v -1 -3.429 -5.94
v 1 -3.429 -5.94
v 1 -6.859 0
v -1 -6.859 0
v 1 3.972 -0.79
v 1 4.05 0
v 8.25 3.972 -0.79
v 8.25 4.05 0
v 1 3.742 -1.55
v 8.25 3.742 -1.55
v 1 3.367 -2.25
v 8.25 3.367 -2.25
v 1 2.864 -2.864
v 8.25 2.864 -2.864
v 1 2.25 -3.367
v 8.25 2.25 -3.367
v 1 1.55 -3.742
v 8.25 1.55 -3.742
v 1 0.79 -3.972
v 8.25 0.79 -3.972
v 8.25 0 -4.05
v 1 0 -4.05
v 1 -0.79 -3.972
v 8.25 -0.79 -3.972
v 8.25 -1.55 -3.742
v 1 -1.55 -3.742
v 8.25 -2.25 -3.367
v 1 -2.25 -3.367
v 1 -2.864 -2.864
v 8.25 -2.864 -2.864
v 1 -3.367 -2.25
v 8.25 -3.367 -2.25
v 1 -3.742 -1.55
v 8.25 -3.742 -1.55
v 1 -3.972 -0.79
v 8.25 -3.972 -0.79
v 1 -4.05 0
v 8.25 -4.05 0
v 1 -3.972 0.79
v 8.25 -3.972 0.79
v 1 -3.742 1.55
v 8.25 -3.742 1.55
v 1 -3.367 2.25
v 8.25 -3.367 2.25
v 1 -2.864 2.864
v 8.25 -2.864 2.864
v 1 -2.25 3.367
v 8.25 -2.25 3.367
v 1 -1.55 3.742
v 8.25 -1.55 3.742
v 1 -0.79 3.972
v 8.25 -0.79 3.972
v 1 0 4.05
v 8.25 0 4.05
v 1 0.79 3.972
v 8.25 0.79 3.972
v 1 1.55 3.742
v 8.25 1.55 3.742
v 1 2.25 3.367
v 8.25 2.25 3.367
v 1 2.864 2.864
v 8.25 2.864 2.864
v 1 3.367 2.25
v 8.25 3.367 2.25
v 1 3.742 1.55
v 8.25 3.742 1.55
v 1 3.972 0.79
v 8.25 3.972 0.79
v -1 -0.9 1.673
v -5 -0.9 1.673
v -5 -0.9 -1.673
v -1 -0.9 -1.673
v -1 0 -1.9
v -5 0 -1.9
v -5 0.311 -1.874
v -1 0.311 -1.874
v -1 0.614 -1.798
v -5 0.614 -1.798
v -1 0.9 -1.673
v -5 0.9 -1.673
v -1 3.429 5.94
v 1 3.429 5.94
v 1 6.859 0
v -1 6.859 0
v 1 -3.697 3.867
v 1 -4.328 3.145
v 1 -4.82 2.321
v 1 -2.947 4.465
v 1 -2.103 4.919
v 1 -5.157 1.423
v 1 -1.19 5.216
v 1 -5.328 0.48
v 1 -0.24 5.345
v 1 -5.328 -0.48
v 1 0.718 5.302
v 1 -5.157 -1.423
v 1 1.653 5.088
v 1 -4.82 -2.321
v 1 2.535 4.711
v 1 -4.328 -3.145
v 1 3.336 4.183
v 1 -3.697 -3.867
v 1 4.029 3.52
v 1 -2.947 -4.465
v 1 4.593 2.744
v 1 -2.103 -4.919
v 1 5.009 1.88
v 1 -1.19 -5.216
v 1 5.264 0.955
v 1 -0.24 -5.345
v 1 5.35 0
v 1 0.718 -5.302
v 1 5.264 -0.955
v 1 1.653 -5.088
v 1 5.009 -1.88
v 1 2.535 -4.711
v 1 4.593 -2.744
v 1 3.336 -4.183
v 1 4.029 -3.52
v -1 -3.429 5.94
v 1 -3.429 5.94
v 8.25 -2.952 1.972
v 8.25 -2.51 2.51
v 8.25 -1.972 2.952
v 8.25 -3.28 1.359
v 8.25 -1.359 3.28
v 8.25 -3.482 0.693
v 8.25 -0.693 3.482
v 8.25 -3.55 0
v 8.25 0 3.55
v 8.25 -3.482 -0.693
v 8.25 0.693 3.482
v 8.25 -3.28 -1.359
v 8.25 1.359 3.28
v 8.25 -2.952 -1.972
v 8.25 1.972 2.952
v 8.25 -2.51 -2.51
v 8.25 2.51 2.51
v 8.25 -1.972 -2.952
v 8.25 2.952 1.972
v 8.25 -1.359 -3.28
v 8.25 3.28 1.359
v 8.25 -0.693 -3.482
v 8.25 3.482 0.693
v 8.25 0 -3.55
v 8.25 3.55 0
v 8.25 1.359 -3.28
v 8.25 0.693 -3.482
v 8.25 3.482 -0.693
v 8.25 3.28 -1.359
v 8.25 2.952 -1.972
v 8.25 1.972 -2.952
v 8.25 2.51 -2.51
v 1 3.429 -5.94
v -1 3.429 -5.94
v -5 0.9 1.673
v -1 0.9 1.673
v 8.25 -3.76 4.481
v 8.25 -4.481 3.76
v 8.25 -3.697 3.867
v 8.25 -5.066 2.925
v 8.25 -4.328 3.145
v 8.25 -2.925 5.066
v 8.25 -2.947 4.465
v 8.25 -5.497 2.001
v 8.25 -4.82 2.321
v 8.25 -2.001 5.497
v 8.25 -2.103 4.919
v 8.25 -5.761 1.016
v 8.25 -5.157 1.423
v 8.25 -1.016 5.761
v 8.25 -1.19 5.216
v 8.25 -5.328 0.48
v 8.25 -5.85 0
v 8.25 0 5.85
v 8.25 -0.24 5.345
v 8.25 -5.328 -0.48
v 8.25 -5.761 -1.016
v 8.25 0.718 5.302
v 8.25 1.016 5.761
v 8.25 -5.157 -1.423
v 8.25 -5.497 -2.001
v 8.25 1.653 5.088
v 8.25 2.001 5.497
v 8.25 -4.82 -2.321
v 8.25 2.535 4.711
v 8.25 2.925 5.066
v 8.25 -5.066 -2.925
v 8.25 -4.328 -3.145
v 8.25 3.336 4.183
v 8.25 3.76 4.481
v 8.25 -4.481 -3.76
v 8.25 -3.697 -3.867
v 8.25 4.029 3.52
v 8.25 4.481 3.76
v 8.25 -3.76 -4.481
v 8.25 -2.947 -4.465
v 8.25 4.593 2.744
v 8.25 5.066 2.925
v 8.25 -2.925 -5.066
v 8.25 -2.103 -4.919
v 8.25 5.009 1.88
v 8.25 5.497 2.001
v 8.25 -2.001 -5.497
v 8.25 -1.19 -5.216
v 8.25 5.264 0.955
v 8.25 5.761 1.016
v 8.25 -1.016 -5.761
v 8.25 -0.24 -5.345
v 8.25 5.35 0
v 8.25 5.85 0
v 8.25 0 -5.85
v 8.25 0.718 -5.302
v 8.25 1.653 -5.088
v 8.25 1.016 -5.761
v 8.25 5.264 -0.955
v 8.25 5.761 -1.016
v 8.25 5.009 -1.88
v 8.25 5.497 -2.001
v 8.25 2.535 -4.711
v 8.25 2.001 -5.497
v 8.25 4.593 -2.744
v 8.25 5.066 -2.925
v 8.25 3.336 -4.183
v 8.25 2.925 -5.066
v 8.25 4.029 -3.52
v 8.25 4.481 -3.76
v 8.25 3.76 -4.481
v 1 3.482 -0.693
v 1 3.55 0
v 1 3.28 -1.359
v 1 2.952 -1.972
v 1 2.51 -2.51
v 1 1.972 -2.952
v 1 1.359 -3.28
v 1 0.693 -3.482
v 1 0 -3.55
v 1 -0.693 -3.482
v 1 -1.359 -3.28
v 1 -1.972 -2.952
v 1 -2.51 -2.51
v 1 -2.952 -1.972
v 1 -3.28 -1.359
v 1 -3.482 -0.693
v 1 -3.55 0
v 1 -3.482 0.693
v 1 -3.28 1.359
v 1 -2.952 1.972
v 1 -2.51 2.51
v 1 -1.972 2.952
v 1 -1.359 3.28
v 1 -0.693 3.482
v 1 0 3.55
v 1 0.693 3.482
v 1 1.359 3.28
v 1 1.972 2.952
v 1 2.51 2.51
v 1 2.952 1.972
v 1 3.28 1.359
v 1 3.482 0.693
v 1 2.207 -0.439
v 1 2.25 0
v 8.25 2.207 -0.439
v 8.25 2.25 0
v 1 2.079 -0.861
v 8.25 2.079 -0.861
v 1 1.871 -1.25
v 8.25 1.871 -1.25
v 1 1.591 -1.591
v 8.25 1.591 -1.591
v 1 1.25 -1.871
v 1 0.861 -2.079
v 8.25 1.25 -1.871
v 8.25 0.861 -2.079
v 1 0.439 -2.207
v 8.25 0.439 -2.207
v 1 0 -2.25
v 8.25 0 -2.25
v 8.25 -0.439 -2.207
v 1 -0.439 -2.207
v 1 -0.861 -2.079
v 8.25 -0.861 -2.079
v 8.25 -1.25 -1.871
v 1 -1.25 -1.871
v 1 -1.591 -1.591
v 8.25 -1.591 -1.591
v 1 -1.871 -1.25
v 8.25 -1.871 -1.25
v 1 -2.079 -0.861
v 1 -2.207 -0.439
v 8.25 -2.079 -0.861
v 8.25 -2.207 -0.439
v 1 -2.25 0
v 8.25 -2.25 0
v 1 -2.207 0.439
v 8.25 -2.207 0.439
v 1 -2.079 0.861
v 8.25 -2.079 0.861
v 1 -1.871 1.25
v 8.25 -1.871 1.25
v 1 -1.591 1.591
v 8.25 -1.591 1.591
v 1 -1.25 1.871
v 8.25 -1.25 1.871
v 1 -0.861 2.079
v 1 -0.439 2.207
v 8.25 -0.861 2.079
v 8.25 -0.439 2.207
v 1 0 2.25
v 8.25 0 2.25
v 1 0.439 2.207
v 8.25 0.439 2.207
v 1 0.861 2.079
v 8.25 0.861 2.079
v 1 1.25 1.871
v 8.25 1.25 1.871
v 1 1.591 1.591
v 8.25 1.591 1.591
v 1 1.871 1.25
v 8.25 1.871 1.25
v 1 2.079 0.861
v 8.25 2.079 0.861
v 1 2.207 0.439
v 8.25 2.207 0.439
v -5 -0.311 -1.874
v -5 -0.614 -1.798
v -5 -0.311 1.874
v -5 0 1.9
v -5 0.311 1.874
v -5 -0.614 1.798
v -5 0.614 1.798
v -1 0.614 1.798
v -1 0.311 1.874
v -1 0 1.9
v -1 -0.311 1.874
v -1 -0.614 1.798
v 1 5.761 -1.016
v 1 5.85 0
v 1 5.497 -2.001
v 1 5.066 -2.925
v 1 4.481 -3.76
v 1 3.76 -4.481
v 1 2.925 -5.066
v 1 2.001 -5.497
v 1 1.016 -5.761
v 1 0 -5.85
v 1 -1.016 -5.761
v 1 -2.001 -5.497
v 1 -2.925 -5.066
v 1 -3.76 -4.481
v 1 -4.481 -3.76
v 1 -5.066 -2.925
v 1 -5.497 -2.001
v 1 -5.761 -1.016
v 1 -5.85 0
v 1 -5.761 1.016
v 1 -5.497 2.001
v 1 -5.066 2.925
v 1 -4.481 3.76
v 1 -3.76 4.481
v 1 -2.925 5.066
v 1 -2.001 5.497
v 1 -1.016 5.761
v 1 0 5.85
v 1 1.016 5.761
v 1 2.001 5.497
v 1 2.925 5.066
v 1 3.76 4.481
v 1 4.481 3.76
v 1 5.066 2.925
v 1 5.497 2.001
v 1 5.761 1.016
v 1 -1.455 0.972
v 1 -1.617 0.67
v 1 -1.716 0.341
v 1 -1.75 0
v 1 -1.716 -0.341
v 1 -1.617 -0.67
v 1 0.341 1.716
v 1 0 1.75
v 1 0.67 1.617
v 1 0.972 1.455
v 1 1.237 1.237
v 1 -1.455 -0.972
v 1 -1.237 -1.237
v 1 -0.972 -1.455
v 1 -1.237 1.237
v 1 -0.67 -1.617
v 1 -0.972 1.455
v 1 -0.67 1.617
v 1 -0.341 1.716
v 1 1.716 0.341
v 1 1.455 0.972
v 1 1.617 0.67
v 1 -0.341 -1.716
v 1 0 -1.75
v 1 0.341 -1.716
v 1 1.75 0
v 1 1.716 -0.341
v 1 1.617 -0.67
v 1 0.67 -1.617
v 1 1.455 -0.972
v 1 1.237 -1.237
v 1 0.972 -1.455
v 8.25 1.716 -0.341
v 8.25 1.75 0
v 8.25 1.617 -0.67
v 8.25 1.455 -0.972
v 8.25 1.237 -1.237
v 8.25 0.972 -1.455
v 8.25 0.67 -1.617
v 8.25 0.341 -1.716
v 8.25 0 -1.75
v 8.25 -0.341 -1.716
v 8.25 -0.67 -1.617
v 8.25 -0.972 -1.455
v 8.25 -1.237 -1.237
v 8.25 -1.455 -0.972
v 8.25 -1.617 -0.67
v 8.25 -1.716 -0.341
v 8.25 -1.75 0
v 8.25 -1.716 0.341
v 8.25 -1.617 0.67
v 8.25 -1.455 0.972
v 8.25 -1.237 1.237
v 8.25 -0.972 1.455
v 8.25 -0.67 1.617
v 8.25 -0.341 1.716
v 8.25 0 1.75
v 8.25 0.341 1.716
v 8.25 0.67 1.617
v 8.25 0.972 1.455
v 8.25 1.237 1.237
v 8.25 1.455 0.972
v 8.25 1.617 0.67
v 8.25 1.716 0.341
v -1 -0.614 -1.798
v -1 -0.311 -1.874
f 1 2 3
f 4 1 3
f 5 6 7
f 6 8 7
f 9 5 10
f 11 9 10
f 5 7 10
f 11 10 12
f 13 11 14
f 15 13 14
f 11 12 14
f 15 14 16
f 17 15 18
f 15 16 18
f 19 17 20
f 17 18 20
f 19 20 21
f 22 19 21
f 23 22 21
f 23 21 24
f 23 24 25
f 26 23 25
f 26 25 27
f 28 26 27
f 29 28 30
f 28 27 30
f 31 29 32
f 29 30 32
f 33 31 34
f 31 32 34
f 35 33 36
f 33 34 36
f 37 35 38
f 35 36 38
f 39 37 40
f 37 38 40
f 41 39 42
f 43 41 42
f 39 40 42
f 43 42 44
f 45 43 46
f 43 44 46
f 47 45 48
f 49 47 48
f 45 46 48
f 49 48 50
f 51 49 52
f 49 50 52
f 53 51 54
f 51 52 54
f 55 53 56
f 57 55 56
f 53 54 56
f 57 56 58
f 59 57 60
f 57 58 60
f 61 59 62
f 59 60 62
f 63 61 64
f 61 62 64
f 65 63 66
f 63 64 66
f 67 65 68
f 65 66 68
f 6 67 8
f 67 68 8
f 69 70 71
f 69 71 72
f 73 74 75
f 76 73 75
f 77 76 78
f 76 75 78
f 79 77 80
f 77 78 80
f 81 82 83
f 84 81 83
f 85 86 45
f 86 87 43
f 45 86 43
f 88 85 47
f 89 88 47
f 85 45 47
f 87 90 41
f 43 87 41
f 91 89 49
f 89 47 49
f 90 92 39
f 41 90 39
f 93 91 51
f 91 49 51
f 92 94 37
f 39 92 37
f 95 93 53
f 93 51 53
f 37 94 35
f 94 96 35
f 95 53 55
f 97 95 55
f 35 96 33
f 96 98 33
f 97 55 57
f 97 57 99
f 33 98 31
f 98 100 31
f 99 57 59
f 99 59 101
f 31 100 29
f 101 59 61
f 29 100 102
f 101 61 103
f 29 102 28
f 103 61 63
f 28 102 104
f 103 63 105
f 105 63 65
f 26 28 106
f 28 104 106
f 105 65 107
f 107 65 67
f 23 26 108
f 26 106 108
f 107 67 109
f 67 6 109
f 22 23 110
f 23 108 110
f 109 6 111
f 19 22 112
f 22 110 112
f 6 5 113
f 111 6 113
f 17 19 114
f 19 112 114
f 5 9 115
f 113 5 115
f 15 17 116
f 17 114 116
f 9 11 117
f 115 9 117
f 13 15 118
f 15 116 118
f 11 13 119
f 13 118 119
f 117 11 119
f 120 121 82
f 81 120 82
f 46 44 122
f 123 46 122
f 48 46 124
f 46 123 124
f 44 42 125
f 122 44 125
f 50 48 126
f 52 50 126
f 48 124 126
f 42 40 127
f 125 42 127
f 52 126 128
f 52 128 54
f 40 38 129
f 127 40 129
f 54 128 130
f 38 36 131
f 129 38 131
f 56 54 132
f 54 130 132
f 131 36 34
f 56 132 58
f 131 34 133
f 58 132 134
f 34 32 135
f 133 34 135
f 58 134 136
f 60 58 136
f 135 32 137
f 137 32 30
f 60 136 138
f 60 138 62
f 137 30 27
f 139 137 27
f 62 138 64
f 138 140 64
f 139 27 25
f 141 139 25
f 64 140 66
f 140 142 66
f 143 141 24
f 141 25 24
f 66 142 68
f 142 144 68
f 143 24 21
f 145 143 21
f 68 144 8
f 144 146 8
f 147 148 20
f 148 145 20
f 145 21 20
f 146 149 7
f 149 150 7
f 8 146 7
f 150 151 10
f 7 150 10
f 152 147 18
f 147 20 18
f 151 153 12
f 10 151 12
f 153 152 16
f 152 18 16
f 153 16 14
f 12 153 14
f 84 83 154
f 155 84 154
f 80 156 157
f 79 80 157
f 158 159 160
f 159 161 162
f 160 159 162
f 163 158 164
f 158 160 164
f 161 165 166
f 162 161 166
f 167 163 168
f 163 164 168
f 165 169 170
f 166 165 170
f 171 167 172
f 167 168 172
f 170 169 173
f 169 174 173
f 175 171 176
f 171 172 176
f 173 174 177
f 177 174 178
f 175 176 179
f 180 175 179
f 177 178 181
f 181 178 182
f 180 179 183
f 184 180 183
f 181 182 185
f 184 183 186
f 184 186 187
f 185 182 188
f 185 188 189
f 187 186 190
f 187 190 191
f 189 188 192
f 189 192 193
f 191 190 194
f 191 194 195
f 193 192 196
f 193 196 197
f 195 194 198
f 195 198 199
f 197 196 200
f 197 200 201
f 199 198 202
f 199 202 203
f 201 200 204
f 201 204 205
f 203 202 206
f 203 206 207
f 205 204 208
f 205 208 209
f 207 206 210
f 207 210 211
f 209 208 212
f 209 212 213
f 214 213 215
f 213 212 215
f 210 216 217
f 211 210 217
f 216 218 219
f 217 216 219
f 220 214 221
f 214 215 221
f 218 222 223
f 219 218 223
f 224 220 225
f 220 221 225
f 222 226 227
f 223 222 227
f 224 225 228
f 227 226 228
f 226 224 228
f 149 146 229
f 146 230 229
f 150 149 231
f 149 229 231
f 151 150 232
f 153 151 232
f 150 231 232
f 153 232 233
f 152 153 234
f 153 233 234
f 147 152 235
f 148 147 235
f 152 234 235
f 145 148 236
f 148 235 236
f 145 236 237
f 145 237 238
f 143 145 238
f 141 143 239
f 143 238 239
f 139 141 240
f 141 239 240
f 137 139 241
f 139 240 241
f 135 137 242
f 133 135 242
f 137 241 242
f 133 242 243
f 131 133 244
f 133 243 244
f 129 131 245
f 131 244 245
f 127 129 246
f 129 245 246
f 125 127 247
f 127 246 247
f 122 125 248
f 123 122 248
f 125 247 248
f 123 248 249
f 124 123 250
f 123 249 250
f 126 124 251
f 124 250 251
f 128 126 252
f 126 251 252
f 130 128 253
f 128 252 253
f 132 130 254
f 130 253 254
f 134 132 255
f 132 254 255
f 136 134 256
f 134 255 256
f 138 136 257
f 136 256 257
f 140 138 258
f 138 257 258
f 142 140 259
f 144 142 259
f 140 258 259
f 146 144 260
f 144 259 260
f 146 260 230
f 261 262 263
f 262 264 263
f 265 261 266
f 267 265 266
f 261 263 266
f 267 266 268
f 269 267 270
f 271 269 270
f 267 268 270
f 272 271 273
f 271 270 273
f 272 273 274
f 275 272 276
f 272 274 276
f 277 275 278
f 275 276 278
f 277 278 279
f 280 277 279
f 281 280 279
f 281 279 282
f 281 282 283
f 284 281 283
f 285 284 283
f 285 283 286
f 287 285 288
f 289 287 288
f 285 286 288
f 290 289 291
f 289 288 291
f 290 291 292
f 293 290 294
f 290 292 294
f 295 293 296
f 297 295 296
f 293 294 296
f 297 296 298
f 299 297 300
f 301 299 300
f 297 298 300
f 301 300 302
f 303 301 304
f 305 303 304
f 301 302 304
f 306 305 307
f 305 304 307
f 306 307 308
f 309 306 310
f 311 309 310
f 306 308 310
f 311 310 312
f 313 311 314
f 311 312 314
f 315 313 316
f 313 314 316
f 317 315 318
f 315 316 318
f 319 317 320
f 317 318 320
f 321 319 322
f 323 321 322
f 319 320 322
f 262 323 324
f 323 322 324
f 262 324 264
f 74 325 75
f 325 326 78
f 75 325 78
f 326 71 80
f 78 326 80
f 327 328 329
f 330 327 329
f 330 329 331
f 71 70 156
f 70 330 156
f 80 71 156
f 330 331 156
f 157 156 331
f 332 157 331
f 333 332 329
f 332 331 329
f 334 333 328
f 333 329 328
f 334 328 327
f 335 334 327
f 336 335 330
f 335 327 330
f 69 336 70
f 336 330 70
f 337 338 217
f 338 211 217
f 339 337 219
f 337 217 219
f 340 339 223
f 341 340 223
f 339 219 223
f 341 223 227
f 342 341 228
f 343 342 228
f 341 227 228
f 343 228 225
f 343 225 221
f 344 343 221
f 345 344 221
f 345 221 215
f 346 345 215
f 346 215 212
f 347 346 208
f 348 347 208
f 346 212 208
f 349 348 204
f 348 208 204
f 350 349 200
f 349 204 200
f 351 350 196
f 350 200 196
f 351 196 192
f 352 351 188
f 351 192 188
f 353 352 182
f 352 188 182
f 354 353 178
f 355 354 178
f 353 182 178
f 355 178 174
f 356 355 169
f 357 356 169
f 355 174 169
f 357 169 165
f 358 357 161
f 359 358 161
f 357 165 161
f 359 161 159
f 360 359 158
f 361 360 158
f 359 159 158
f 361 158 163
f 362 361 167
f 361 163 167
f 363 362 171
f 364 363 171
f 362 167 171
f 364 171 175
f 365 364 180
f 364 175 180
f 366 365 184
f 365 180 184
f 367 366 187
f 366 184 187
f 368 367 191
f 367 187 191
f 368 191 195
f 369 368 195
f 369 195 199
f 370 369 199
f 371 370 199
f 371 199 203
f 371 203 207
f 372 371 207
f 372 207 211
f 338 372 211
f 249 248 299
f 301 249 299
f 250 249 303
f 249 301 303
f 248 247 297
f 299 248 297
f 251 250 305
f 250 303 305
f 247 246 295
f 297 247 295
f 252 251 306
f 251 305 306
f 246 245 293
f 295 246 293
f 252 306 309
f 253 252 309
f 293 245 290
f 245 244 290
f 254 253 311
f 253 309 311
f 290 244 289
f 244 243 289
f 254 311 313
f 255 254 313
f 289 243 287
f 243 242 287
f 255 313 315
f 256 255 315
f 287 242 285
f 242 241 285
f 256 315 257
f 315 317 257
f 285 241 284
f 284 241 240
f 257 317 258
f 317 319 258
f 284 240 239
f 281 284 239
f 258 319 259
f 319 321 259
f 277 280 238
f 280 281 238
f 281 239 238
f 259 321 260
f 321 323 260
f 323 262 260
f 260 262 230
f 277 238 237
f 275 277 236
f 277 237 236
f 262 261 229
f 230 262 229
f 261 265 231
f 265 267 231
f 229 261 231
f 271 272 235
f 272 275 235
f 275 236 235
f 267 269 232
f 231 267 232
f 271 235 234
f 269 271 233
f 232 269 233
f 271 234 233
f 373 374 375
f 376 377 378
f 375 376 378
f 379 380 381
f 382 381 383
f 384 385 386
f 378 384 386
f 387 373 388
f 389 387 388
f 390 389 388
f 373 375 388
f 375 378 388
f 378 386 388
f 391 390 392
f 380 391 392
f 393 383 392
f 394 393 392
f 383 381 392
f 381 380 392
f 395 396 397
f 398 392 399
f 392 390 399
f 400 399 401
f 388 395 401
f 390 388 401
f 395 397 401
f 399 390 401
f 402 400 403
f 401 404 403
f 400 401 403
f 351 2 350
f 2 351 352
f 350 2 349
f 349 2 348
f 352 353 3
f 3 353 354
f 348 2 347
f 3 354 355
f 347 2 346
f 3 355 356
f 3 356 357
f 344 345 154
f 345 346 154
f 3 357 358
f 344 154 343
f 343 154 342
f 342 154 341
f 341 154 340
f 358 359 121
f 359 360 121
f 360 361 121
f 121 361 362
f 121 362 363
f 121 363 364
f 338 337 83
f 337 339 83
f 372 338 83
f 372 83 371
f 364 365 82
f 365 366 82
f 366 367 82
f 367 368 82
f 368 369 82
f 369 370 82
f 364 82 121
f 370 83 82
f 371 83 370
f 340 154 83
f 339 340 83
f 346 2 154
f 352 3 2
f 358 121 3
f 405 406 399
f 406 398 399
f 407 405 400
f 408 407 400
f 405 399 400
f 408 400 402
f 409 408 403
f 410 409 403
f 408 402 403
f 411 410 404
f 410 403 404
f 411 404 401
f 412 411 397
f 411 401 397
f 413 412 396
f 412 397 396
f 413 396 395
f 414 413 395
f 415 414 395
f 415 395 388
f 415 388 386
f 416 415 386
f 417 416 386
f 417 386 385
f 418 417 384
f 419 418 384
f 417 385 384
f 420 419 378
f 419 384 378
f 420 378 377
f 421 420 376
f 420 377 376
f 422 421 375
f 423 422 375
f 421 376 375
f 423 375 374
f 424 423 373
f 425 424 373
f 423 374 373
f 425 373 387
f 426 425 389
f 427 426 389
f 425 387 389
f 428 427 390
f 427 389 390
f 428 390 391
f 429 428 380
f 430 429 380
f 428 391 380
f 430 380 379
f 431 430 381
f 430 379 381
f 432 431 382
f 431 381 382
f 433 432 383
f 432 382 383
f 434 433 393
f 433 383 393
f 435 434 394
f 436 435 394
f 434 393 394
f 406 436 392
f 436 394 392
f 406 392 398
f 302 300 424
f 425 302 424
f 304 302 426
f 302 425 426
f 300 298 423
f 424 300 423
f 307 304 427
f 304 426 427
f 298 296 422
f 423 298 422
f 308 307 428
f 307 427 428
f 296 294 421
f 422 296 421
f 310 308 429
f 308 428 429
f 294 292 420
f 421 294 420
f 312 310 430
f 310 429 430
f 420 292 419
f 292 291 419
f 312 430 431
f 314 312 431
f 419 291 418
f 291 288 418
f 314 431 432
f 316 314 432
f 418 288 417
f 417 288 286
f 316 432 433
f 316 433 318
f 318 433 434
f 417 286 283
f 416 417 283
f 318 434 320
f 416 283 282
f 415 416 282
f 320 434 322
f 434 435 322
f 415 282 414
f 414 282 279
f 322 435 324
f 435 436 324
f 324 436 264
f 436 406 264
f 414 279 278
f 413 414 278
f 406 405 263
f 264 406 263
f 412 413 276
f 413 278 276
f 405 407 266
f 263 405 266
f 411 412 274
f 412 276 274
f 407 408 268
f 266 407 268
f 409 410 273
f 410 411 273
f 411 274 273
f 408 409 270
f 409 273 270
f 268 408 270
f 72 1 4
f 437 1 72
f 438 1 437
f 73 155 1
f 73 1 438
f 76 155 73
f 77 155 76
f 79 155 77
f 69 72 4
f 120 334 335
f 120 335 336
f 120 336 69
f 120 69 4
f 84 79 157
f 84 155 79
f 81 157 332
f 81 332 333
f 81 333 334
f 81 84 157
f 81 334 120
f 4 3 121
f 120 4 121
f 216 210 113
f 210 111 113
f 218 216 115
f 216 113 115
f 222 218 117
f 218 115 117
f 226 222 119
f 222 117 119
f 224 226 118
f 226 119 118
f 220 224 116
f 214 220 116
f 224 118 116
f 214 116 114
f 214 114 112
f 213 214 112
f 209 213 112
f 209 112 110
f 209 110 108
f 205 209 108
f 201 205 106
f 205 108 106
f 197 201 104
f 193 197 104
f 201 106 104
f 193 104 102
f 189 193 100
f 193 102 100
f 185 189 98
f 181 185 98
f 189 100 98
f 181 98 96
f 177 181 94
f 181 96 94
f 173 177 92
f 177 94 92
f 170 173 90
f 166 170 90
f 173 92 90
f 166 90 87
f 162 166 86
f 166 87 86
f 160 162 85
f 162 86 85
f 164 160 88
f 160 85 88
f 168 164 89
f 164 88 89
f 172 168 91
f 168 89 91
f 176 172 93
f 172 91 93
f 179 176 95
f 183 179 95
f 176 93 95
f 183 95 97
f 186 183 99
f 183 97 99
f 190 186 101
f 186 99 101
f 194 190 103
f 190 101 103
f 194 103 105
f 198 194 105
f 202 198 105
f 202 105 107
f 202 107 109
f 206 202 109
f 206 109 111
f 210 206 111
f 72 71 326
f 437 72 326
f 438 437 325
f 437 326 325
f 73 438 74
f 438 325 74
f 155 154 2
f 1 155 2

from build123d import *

# Parameters (mm, degrees)
BOSS_EXTRUDE1_DEPTH = 1
BOSS_EXTRUDE2_START = -1
SKETCH2_3_R         = 5.85
BOSS_EXTRUDE2_DEPTH = 1
SKETCH3_W           = 4
SKETCH3_H           = 1.8
BOSS_EXTRUDE3_DEPTH = 1.9
CUT_EXTRUDE1_DEPTH  = 4


with BuildPart() as part:
    # Sketch1 → Revolve1 (revolve)
    with BuildSketch(Plane.XY):
        Polygon((0, 0), (0, 5.85), (8.25, 5.85), (8.25, 5.35), (1, 5.35), (1, 4.05), (8.25, 4.05), (8.25, 3.55), (1, 3.55), (1, 2.25), (8.25, 2.25), (8.25, 1.75), (1, 1.75), (1, 0), align=None)
    revolve(axis=Axis((1, 0, 0), (-1, 0, 0)))

    # Sketch2 → Boss-Extrude1 (add)
    with BuildSketch(Plane.ZY):
        Polygon((0, 6.858921198), (-5.94, 3.429460599), (-5.94, -3.429460599), (0, -6.858921198), (5.94, -3.429460599), (5.94, 3.429460599), align=None)
    extrude(amount=BOSS_EXTRUDE1_DEPTH)

    # Sketch2<3> → Boss-Extrude2 (add)
    with BuildSketch(Plane.ZY.offset(BOSS_EXTRUDE2_START)):
        Polygon((5.94, -3.429460599), (5.94, 3.429460599), (0, 6.858921198), (-5.94, 3.429460599), (-5.94, -3.429460599), (0, -6.858921198), align=None)
        with Locations(Location((0, 0, 0), (0, 0, 90))):
            Circle(SKETCH2_3_R, mode=Mode.SUBTRACT)
    extrude(amount=BOSS_EXTRUDE2_DEPTH)

    # Sketch3 → Boss-Extrude3 (add, symmetric)
    with BuildSketch(Plane.XY):
        with Locations((-3, 0)):
            Rectangle(SKETCH3_W, SKETCH3_H)
    extrude(amount=BOSS_EXTRUDE3_DEPTH, both=True)

    # Sketch4 → Cut-Extrude1 (cut)
    with BuildSketch(Plane.ZY.offset(5)):
        with BuildLine():
            Line((-1.9, 0.9), (-1.9, 0))
            ThreePointArc((-1.9, 0), (-1.842458697, 0.464053822), (-1.673320053, 0.9))
            Line((-1.673320053, 0.9), (-1.9, 0.9))
        make_face()
        with BuildLine():
            Line((-1.9, 0), (-1.9, -0.9))
            Line((-1.9, -0.9), (-1.673320053, -0.9))
            ThreePointArc((-1.673320053, -0.9), (-1.842458697, -0.464053822), (-1.9, 0))
        make_face()
        with BuildLine():
            ThreePointArc((1.9, 0), (1.842458697, -0.464053822), (1.673320053, -0.9))
            Line((1.673320053, -0.9), (1.9, -0.9))
            Line((1.9, -0.9), (1.9, 0))
        make_face()
        with BuildLine():
            ThreePointArc((1.673320053, 0.9), (1.842458697, 0.464053822), (1.9, 0))
            Line((1.9, 0), (1.9, 0.9))
            Line((1.9, 0.9), (1.673320053, 0.9))
        make_face()
    extrude(amount=-CUT_EXTRUDE1_DEPTH, mode=Mode.SUBTRACT)


solid = part.part
